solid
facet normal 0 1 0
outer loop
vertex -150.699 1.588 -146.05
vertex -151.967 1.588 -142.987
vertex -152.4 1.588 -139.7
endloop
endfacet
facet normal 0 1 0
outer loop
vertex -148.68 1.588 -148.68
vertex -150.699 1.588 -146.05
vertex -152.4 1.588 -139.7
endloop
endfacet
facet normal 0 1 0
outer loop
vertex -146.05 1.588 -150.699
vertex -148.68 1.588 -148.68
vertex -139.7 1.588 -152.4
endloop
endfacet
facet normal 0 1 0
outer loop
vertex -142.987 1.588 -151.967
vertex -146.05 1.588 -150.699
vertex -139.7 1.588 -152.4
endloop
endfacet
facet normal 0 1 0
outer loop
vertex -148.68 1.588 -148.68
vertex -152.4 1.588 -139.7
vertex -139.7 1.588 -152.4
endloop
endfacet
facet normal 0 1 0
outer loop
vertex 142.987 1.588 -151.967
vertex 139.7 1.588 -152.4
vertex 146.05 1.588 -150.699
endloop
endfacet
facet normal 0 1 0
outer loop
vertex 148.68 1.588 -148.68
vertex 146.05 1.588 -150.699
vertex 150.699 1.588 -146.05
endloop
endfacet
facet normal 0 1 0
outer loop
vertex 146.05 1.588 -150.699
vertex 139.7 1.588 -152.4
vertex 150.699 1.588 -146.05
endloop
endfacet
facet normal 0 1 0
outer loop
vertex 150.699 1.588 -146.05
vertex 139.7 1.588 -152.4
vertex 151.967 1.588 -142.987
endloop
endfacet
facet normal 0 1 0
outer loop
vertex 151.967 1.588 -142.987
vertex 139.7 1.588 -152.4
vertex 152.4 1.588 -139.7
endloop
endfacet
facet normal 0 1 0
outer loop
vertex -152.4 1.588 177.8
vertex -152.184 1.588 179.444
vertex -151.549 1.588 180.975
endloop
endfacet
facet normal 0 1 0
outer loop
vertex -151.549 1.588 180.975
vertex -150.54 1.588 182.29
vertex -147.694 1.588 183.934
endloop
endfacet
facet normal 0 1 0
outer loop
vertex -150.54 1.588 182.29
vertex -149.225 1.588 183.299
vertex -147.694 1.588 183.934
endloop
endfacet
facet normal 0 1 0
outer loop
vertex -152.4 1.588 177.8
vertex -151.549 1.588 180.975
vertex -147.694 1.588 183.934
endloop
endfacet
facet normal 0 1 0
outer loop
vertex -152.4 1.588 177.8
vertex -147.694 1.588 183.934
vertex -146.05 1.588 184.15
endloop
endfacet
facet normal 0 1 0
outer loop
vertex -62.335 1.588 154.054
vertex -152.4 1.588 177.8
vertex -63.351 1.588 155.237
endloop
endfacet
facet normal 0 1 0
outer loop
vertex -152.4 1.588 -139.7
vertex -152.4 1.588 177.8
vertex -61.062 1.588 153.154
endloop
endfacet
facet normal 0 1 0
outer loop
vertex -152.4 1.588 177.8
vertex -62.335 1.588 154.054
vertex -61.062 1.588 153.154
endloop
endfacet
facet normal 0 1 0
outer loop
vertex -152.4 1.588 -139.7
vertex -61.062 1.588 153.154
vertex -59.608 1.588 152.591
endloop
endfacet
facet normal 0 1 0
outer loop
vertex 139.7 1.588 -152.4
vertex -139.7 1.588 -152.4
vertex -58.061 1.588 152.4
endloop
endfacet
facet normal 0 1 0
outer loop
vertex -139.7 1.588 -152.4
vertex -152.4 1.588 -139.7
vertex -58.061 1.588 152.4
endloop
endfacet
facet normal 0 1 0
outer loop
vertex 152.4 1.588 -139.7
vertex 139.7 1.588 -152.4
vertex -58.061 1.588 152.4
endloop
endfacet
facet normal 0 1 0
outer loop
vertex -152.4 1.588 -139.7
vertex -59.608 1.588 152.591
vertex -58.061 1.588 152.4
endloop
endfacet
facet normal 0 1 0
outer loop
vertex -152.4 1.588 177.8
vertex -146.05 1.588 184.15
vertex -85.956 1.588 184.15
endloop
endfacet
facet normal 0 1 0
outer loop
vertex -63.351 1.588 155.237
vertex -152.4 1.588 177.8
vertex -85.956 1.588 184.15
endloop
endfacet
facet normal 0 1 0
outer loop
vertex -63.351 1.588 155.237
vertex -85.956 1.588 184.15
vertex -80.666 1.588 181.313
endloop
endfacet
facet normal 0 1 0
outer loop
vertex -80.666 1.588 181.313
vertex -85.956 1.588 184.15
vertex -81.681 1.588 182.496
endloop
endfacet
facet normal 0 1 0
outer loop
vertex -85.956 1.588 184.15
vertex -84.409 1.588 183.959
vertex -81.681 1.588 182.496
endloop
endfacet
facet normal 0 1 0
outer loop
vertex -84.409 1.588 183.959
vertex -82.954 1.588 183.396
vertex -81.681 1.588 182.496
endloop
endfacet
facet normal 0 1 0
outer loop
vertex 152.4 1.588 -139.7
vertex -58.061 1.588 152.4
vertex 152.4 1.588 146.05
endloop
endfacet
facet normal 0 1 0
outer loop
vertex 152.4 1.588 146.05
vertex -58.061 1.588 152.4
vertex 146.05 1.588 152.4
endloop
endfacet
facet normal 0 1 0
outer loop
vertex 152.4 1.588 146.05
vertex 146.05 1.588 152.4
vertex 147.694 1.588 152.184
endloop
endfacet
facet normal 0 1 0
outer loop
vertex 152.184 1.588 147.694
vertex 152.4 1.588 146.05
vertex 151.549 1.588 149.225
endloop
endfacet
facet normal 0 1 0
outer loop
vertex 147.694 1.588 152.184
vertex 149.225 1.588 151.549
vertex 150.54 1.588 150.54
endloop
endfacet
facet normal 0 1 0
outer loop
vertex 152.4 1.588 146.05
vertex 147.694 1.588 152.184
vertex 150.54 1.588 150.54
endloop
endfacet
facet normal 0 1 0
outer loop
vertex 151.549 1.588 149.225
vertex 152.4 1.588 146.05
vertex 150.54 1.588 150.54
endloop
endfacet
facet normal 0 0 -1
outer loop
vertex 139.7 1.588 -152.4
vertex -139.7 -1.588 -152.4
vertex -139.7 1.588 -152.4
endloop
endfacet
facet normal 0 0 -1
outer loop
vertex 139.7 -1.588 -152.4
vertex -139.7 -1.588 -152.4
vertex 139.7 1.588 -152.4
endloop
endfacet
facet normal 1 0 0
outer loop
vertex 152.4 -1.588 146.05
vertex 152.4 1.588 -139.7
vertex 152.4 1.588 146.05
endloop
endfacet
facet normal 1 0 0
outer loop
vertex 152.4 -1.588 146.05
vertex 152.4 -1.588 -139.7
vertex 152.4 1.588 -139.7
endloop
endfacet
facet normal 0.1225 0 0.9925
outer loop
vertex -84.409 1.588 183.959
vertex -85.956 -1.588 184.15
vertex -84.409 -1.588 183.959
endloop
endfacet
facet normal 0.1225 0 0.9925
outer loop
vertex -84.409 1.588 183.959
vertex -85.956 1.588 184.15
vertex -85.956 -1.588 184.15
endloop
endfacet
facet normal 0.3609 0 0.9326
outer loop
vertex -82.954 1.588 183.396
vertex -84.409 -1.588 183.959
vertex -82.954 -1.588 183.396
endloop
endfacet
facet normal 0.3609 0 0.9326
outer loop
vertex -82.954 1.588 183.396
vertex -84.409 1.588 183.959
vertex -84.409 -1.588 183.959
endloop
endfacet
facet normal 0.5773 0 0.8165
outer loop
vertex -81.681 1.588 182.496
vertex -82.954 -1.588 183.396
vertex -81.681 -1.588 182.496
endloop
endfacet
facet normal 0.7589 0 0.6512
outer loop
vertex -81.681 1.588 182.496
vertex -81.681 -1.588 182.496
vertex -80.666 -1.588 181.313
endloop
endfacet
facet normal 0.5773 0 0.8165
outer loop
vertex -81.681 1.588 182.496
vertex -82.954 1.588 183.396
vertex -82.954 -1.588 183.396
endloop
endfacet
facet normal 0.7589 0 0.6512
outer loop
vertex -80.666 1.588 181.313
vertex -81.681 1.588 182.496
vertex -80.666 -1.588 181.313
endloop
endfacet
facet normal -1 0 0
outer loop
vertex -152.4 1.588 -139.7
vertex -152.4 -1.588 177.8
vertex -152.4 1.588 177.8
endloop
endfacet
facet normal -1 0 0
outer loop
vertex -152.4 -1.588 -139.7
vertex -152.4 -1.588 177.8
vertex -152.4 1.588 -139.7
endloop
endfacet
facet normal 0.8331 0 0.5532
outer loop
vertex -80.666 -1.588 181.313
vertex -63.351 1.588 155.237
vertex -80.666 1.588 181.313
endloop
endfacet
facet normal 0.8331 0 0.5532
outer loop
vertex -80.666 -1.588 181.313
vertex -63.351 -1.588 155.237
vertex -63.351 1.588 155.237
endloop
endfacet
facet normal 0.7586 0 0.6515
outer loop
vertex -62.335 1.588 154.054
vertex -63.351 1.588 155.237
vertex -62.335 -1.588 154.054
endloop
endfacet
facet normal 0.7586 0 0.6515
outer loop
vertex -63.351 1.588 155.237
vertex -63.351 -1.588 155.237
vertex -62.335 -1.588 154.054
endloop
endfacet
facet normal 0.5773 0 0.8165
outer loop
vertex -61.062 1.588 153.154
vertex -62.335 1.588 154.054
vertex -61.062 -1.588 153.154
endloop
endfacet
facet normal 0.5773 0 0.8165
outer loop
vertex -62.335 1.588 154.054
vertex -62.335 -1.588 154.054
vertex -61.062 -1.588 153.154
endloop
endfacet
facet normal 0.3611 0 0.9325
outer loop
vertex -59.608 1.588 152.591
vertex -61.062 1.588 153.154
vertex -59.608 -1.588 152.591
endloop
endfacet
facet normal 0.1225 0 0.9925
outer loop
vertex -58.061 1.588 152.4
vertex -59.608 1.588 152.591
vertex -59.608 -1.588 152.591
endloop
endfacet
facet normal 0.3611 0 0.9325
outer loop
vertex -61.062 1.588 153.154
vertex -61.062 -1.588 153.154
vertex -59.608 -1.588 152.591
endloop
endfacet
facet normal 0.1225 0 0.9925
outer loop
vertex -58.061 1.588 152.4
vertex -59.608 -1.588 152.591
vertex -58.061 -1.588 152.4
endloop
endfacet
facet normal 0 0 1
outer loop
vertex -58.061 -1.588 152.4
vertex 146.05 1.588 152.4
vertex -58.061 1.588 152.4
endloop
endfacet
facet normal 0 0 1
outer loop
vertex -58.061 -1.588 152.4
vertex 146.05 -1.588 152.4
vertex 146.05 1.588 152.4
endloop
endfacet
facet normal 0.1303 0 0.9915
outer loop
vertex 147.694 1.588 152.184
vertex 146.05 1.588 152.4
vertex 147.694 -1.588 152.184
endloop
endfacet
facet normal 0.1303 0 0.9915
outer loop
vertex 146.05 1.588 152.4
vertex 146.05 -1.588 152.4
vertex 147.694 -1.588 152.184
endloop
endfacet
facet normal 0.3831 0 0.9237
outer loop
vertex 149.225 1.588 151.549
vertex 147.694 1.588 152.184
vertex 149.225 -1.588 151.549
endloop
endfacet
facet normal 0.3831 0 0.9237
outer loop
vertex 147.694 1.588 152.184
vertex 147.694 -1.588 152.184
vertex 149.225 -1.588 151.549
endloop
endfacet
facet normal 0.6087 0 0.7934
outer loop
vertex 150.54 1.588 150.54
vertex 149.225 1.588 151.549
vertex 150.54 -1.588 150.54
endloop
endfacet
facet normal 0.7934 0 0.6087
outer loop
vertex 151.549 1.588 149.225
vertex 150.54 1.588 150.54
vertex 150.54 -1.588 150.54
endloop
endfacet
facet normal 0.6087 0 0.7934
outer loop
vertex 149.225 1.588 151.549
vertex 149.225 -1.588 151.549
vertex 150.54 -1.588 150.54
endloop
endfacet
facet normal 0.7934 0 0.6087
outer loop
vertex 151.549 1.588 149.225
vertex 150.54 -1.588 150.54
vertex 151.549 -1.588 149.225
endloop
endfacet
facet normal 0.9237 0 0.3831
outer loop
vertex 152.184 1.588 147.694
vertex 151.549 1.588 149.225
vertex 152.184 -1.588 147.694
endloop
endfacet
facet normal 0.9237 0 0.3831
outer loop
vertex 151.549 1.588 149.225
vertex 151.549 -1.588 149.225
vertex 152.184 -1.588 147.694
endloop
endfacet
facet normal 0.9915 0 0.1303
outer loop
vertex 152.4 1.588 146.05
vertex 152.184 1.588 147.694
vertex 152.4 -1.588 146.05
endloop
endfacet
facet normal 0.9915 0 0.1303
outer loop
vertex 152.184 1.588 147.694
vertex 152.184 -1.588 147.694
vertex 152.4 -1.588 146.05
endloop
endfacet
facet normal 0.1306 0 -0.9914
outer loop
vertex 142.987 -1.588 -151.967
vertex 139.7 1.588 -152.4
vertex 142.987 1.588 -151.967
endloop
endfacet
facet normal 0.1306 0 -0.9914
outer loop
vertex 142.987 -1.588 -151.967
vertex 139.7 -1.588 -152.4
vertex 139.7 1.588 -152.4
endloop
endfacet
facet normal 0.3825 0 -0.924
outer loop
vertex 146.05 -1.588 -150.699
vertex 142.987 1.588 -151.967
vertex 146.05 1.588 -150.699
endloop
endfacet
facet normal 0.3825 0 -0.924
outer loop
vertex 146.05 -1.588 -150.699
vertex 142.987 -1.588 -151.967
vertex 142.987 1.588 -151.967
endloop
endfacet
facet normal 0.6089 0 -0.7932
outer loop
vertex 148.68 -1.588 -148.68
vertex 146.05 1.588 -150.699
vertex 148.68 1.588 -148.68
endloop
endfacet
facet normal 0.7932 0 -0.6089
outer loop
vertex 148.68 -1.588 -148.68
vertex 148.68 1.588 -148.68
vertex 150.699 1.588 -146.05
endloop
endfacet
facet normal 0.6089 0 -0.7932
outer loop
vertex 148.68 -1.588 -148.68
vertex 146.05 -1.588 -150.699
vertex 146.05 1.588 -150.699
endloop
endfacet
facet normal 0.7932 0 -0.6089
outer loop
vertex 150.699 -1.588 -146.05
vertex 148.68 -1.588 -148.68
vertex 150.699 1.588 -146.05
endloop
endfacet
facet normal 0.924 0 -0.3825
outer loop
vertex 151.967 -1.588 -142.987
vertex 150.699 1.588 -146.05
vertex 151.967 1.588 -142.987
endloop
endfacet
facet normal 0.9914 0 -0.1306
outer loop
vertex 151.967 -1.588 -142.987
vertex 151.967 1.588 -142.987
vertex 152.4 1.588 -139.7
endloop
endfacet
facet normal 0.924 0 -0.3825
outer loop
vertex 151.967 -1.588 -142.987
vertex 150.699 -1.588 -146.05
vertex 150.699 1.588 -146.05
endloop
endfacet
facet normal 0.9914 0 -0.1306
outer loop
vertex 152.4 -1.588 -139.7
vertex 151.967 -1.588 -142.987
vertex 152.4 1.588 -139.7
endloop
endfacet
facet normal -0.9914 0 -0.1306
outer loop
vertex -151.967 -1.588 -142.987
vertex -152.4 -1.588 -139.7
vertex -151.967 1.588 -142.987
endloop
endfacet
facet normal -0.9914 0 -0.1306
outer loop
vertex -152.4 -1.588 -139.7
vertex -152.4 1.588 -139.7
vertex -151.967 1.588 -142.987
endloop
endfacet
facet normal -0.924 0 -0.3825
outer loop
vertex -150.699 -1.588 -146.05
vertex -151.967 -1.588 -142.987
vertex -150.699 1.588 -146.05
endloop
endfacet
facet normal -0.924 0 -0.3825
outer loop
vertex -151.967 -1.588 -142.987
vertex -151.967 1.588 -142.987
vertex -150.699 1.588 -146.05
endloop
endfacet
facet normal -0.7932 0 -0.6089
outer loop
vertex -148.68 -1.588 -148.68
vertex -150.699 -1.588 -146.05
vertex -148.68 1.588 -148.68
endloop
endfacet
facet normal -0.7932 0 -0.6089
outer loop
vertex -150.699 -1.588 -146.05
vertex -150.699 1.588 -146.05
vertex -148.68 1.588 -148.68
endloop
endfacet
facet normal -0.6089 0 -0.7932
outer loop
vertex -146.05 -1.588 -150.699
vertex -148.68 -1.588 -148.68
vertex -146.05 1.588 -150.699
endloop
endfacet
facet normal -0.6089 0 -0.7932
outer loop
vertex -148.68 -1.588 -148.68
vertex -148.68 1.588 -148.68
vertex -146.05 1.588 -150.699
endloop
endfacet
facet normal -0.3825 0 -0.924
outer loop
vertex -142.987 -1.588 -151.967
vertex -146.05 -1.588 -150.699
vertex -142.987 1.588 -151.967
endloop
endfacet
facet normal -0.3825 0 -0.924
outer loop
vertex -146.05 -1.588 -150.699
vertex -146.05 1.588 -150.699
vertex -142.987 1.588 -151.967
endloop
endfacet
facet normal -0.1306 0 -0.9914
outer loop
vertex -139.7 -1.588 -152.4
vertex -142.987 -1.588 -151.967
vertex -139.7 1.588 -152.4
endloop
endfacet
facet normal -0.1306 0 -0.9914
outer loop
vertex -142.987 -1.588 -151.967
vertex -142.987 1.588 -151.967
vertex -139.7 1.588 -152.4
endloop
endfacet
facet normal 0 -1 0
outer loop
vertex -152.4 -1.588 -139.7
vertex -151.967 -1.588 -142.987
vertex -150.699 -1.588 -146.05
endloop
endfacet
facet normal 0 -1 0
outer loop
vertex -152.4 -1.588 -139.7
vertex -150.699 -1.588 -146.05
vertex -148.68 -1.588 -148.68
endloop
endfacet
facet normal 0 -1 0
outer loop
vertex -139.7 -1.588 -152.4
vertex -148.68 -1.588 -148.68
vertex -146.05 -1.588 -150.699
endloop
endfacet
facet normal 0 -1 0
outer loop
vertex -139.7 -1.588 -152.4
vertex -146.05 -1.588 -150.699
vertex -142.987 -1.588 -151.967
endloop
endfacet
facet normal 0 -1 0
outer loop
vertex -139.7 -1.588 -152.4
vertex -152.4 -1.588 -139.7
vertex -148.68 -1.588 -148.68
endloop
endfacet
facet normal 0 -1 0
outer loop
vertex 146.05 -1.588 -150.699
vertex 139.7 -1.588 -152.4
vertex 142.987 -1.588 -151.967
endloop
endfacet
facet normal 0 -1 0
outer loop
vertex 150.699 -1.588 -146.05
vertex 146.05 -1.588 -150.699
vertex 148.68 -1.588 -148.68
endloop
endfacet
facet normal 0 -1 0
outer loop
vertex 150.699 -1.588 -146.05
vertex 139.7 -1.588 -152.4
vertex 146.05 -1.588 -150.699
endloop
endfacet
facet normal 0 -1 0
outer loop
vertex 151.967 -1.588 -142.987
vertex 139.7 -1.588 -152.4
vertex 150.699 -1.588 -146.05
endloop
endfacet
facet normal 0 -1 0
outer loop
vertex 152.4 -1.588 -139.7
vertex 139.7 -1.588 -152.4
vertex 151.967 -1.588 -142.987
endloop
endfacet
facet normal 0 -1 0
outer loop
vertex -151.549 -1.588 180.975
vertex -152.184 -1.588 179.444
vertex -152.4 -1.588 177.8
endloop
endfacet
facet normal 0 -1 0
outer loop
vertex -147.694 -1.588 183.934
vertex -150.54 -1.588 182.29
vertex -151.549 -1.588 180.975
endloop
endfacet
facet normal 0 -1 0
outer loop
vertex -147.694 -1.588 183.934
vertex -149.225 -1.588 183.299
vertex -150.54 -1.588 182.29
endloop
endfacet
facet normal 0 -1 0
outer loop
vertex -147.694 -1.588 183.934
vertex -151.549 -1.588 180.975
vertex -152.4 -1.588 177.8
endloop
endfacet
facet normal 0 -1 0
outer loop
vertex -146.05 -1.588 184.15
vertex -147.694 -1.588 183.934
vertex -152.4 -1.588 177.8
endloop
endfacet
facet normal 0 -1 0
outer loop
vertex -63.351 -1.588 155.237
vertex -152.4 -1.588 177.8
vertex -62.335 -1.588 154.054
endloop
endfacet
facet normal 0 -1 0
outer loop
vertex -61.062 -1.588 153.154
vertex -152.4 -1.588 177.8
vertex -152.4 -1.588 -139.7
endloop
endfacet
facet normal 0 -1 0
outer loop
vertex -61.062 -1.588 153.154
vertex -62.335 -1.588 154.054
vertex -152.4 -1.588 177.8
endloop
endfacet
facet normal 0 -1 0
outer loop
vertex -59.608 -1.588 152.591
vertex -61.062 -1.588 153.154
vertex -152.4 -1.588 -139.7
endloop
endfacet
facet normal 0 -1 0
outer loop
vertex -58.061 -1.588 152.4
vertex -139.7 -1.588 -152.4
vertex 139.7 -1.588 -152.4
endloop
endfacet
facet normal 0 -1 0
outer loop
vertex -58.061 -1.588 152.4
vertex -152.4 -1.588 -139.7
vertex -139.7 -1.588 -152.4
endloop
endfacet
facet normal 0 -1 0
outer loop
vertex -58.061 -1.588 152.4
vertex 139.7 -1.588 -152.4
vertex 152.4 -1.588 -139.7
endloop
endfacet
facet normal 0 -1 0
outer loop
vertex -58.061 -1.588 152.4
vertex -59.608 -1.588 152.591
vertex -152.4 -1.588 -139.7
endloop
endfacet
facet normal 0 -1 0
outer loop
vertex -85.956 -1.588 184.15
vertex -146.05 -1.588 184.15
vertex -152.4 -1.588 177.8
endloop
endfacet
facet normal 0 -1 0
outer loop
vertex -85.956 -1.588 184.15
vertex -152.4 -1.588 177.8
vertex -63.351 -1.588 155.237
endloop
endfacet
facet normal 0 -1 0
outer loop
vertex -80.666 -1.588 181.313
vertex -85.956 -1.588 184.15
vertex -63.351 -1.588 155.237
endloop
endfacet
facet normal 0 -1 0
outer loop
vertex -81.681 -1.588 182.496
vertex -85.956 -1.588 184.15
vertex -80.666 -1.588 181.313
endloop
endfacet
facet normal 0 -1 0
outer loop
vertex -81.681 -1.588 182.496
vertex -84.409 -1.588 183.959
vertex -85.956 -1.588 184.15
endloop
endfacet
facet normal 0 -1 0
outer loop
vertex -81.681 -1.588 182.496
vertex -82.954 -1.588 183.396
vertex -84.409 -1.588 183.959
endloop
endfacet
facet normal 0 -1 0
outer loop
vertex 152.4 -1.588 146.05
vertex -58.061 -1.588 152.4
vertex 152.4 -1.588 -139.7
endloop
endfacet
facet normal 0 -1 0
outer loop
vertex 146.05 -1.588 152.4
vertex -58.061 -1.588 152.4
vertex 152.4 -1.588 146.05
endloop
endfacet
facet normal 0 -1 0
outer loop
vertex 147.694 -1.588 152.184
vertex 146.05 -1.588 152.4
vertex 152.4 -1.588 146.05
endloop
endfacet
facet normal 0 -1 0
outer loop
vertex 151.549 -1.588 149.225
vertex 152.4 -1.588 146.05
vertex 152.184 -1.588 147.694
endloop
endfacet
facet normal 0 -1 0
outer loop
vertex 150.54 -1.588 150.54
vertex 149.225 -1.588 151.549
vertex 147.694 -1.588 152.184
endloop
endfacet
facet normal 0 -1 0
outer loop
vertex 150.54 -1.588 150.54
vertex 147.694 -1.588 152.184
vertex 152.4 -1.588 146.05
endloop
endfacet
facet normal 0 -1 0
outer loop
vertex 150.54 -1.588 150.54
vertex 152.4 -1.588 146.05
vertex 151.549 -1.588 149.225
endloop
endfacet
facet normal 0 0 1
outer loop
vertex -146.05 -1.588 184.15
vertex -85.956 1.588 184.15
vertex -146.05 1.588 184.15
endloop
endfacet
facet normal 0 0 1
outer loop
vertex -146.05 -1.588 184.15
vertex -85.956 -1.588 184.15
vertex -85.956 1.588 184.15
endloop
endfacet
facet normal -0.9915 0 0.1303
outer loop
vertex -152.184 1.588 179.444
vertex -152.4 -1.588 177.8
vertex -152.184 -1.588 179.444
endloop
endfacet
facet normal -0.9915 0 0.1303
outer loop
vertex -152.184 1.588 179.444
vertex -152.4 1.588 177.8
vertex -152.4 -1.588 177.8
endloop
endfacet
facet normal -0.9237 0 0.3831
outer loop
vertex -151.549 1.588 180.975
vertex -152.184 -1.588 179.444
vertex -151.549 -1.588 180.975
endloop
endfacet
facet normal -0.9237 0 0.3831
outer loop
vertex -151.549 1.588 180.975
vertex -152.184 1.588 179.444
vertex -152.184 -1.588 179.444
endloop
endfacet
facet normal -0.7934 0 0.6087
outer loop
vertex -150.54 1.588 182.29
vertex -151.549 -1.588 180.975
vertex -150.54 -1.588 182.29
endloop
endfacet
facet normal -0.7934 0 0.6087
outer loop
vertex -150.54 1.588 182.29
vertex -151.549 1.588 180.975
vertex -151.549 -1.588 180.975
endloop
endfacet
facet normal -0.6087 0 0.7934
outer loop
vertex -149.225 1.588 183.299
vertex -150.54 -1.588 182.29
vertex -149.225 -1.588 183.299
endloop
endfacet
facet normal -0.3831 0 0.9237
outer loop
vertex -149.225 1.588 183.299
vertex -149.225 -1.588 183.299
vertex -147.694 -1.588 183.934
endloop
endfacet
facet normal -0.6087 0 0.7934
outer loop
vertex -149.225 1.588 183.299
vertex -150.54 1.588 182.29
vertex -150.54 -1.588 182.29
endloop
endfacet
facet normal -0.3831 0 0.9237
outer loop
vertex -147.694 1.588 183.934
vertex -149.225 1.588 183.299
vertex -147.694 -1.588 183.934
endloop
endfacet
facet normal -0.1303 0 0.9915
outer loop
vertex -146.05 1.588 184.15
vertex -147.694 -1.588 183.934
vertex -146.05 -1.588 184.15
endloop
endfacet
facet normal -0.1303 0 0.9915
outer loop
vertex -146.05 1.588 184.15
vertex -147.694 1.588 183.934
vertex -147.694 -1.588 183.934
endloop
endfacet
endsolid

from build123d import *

# Parameters (mm, degrees)
F1_DEPTH = 1.5875
F2_R     = 6.35
F3_R     = 12.7


with BuildPart() as f1:
    # F0 (on Front) → F1 (new body, symmetric)
    with BuildSketch(Plane.XZ):
        Polygon((-152.4, 152.4), (-152.4, -152.4), (152.4, -152.4), (152.4, 152.4), (-61.4666454494, 152.4), (-82.55, 184.15), (-152.4, 184.15), align=None)
    extrude(amount=F1_DEPTH, both=True)

    # F2
    f2_edges = [f1.edges().sort_by_distance(p)[0] for p in [
        (152.4, 0, 152.4),
        (-152.4, 0, 184.15),
        (-61.466645, 0, 152.4),
        (-82.55, 0, 184.15),
    ]]
    fillet(f2_edges, radius=F2_R)

    # F3
    f3_edges = [f1.edges().sort_by_distance(p)[0] for p in [
        (152.4, 0, -152.4),
        (-152.4, 0, -152.4),
    ]]
    fillet(f3_edges, radius=F3_R)


solid = f1.part
